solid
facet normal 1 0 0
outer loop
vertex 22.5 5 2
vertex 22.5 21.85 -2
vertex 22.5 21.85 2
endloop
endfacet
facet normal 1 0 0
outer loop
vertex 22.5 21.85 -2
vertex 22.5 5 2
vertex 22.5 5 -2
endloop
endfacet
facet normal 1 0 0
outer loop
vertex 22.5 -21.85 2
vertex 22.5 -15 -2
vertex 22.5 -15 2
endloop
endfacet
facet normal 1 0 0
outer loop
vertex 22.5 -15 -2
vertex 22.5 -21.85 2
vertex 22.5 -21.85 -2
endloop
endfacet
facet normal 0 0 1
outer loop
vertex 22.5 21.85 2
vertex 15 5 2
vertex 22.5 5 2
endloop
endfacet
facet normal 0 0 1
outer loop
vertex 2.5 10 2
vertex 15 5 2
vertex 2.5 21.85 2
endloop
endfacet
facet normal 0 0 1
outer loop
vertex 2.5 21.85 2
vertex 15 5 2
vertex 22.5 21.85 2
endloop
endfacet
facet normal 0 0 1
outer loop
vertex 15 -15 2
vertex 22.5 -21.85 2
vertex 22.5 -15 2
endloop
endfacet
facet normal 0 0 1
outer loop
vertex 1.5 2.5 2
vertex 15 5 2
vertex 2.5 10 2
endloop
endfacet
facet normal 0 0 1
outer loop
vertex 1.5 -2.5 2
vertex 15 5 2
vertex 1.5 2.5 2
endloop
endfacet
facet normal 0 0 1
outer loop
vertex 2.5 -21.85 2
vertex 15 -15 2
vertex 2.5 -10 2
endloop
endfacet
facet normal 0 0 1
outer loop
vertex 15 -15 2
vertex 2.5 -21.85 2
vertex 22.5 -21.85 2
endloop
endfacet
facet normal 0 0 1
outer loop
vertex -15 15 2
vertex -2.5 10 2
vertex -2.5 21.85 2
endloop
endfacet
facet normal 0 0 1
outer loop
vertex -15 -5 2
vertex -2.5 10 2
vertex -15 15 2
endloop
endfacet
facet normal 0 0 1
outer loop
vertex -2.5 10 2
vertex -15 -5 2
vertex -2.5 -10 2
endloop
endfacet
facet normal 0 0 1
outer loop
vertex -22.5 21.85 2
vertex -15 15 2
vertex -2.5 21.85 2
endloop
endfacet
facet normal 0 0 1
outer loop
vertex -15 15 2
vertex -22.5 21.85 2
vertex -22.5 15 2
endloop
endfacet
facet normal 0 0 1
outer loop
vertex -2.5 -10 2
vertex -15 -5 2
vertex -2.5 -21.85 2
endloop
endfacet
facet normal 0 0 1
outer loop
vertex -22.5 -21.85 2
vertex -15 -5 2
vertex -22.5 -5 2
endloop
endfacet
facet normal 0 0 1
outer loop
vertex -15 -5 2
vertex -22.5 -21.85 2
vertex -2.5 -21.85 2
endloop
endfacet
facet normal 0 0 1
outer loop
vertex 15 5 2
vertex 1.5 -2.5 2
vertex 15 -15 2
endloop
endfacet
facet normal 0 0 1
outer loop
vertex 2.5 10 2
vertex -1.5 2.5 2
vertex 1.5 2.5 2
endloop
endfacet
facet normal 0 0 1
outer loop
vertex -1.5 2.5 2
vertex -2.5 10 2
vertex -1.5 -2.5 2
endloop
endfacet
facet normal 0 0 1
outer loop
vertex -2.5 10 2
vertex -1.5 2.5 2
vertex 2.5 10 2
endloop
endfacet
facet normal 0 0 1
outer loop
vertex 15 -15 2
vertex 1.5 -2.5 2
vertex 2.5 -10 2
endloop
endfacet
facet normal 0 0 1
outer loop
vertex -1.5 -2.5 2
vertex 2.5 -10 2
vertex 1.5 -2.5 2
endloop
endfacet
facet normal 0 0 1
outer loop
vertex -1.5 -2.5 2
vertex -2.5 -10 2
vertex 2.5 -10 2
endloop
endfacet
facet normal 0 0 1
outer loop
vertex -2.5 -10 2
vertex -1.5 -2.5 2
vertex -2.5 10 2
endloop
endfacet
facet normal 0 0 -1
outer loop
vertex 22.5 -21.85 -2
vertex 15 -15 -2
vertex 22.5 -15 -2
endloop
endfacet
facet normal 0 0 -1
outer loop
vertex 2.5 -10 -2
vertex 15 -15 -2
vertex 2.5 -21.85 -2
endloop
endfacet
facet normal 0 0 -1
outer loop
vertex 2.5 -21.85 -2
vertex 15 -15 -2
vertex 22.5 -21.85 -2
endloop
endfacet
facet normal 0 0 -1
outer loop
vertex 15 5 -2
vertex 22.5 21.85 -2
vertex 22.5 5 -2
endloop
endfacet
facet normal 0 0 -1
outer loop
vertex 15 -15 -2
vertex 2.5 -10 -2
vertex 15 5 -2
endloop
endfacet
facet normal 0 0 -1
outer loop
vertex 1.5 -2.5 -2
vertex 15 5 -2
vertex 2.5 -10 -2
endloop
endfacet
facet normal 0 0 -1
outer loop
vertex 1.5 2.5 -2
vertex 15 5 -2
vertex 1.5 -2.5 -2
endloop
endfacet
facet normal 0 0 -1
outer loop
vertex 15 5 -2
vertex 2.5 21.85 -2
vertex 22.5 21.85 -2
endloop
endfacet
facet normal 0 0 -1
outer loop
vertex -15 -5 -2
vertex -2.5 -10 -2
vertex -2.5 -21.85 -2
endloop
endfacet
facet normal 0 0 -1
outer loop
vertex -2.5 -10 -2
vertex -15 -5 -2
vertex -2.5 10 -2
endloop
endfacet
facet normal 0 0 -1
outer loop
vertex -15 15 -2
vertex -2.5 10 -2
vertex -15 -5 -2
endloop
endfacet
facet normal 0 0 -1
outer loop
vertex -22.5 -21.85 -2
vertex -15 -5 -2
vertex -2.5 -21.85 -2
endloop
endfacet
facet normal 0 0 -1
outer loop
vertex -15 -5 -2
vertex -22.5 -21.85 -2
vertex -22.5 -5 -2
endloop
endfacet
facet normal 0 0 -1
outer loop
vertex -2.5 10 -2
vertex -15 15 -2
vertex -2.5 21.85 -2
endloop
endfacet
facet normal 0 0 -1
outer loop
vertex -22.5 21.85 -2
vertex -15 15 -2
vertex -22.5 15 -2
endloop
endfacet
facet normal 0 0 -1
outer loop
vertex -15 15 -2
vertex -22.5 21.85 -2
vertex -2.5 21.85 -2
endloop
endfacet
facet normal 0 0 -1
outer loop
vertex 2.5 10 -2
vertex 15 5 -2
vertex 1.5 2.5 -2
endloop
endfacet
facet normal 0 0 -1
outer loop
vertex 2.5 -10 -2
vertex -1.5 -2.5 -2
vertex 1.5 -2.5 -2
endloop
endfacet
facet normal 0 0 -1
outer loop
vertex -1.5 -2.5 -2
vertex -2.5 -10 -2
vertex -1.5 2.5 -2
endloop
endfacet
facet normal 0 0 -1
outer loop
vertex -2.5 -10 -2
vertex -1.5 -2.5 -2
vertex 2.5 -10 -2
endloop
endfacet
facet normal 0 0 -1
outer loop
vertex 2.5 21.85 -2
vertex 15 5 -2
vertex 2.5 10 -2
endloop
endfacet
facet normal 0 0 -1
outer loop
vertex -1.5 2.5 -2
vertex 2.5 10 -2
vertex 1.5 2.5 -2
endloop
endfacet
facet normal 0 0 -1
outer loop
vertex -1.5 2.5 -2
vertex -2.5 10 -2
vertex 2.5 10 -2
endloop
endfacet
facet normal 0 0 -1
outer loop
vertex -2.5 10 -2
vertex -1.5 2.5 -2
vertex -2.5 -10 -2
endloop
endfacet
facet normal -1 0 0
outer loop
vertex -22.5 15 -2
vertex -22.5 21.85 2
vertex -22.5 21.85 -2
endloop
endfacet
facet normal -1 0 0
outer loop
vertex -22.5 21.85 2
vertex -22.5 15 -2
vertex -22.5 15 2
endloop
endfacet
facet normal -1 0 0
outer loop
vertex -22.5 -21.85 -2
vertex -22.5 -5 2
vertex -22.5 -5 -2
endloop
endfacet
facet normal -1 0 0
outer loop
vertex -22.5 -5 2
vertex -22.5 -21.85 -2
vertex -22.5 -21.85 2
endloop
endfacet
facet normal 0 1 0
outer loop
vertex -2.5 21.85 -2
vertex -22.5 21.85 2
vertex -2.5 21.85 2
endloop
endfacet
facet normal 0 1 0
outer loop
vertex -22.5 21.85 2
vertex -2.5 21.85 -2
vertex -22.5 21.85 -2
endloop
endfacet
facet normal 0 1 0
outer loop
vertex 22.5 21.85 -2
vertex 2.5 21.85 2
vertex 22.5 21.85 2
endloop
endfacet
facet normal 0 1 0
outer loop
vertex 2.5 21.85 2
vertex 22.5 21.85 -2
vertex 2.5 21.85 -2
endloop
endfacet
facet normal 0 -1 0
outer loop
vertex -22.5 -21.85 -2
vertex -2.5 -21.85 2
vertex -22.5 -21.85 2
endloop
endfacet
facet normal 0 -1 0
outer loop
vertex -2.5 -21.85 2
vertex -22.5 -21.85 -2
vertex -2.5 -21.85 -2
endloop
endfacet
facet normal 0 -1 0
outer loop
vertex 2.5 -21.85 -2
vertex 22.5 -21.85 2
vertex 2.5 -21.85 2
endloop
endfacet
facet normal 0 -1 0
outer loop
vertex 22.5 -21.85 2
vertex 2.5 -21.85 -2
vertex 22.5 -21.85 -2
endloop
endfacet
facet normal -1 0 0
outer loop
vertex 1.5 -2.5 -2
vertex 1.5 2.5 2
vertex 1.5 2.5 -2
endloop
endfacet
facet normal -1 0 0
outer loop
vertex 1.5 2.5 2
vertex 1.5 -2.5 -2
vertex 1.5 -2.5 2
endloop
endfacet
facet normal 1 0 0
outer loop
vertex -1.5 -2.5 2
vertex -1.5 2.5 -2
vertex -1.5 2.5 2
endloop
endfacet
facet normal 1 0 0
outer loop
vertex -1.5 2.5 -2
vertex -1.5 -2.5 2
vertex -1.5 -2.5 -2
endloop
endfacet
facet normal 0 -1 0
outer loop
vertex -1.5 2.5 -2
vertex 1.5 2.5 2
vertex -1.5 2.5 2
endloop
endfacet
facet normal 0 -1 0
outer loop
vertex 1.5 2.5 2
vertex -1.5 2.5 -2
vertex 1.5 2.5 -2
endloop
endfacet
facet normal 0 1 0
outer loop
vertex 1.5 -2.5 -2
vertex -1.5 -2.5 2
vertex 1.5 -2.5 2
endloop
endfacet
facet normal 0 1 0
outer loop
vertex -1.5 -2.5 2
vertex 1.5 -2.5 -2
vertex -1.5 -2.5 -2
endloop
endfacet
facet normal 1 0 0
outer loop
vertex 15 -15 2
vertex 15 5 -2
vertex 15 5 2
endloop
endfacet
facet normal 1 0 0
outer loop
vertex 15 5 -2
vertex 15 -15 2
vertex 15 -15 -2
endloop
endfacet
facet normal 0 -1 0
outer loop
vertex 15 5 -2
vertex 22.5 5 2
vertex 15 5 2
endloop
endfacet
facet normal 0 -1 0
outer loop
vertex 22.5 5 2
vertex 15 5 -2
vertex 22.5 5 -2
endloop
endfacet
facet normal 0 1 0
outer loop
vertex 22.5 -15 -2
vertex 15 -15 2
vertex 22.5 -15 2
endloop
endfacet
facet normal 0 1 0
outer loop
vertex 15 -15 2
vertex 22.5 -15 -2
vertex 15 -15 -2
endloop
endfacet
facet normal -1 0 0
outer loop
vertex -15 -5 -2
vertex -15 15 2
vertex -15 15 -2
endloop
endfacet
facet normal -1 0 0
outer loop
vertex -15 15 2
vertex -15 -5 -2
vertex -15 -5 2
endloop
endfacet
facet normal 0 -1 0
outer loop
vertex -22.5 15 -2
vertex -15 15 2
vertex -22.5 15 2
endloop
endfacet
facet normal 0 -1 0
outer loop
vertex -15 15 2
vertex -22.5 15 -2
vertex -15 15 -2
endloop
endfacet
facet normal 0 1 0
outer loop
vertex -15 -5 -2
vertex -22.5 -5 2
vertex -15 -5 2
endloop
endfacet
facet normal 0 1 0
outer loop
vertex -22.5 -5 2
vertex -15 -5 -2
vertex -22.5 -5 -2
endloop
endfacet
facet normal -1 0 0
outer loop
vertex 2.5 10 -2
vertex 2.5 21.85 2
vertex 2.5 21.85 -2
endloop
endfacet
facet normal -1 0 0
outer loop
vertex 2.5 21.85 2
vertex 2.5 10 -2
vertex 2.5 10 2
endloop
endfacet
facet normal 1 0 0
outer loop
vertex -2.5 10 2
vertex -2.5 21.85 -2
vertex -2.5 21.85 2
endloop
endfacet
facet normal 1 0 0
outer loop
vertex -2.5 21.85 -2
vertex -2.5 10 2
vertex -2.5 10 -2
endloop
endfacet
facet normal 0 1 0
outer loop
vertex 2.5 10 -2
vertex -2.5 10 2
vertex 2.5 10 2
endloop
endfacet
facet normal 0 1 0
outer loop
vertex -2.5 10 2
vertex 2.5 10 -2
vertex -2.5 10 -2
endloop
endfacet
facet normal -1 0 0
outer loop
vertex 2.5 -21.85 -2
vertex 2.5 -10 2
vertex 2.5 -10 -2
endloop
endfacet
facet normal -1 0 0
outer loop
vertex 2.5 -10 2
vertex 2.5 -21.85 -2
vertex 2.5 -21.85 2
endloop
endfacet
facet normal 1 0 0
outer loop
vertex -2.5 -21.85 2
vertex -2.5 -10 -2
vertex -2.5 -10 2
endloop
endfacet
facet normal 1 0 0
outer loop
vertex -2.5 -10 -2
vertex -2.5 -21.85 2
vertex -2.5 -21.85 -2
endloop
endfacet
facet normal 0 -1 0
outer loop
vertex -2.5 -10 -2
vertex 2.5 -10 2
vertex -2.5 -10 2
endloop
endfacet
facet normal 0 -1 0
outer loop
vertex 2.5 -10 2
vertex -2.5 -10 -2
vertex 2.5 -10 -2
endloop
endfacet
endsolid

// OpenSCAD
// needed to attach a stepper motor to the base
module baseMearm(){
	difference(){

		cube([45,43.7,4],center=true);
		translate([0,0,0]){
			cube([3,5,10],center=true);
		}
		translate([20,-5,0]){
			cube([10,20,10],center=true);
		}
		translate([-20,5,0]){
			cube([10,20,10],center=true);
		}
		translate([0,20,0]){
			cube([5,20,10],center=true);
		}
		translate([0,-20,0]){
			cube([5,20,10],center=true);
		}
	}
}
baseMearm();
